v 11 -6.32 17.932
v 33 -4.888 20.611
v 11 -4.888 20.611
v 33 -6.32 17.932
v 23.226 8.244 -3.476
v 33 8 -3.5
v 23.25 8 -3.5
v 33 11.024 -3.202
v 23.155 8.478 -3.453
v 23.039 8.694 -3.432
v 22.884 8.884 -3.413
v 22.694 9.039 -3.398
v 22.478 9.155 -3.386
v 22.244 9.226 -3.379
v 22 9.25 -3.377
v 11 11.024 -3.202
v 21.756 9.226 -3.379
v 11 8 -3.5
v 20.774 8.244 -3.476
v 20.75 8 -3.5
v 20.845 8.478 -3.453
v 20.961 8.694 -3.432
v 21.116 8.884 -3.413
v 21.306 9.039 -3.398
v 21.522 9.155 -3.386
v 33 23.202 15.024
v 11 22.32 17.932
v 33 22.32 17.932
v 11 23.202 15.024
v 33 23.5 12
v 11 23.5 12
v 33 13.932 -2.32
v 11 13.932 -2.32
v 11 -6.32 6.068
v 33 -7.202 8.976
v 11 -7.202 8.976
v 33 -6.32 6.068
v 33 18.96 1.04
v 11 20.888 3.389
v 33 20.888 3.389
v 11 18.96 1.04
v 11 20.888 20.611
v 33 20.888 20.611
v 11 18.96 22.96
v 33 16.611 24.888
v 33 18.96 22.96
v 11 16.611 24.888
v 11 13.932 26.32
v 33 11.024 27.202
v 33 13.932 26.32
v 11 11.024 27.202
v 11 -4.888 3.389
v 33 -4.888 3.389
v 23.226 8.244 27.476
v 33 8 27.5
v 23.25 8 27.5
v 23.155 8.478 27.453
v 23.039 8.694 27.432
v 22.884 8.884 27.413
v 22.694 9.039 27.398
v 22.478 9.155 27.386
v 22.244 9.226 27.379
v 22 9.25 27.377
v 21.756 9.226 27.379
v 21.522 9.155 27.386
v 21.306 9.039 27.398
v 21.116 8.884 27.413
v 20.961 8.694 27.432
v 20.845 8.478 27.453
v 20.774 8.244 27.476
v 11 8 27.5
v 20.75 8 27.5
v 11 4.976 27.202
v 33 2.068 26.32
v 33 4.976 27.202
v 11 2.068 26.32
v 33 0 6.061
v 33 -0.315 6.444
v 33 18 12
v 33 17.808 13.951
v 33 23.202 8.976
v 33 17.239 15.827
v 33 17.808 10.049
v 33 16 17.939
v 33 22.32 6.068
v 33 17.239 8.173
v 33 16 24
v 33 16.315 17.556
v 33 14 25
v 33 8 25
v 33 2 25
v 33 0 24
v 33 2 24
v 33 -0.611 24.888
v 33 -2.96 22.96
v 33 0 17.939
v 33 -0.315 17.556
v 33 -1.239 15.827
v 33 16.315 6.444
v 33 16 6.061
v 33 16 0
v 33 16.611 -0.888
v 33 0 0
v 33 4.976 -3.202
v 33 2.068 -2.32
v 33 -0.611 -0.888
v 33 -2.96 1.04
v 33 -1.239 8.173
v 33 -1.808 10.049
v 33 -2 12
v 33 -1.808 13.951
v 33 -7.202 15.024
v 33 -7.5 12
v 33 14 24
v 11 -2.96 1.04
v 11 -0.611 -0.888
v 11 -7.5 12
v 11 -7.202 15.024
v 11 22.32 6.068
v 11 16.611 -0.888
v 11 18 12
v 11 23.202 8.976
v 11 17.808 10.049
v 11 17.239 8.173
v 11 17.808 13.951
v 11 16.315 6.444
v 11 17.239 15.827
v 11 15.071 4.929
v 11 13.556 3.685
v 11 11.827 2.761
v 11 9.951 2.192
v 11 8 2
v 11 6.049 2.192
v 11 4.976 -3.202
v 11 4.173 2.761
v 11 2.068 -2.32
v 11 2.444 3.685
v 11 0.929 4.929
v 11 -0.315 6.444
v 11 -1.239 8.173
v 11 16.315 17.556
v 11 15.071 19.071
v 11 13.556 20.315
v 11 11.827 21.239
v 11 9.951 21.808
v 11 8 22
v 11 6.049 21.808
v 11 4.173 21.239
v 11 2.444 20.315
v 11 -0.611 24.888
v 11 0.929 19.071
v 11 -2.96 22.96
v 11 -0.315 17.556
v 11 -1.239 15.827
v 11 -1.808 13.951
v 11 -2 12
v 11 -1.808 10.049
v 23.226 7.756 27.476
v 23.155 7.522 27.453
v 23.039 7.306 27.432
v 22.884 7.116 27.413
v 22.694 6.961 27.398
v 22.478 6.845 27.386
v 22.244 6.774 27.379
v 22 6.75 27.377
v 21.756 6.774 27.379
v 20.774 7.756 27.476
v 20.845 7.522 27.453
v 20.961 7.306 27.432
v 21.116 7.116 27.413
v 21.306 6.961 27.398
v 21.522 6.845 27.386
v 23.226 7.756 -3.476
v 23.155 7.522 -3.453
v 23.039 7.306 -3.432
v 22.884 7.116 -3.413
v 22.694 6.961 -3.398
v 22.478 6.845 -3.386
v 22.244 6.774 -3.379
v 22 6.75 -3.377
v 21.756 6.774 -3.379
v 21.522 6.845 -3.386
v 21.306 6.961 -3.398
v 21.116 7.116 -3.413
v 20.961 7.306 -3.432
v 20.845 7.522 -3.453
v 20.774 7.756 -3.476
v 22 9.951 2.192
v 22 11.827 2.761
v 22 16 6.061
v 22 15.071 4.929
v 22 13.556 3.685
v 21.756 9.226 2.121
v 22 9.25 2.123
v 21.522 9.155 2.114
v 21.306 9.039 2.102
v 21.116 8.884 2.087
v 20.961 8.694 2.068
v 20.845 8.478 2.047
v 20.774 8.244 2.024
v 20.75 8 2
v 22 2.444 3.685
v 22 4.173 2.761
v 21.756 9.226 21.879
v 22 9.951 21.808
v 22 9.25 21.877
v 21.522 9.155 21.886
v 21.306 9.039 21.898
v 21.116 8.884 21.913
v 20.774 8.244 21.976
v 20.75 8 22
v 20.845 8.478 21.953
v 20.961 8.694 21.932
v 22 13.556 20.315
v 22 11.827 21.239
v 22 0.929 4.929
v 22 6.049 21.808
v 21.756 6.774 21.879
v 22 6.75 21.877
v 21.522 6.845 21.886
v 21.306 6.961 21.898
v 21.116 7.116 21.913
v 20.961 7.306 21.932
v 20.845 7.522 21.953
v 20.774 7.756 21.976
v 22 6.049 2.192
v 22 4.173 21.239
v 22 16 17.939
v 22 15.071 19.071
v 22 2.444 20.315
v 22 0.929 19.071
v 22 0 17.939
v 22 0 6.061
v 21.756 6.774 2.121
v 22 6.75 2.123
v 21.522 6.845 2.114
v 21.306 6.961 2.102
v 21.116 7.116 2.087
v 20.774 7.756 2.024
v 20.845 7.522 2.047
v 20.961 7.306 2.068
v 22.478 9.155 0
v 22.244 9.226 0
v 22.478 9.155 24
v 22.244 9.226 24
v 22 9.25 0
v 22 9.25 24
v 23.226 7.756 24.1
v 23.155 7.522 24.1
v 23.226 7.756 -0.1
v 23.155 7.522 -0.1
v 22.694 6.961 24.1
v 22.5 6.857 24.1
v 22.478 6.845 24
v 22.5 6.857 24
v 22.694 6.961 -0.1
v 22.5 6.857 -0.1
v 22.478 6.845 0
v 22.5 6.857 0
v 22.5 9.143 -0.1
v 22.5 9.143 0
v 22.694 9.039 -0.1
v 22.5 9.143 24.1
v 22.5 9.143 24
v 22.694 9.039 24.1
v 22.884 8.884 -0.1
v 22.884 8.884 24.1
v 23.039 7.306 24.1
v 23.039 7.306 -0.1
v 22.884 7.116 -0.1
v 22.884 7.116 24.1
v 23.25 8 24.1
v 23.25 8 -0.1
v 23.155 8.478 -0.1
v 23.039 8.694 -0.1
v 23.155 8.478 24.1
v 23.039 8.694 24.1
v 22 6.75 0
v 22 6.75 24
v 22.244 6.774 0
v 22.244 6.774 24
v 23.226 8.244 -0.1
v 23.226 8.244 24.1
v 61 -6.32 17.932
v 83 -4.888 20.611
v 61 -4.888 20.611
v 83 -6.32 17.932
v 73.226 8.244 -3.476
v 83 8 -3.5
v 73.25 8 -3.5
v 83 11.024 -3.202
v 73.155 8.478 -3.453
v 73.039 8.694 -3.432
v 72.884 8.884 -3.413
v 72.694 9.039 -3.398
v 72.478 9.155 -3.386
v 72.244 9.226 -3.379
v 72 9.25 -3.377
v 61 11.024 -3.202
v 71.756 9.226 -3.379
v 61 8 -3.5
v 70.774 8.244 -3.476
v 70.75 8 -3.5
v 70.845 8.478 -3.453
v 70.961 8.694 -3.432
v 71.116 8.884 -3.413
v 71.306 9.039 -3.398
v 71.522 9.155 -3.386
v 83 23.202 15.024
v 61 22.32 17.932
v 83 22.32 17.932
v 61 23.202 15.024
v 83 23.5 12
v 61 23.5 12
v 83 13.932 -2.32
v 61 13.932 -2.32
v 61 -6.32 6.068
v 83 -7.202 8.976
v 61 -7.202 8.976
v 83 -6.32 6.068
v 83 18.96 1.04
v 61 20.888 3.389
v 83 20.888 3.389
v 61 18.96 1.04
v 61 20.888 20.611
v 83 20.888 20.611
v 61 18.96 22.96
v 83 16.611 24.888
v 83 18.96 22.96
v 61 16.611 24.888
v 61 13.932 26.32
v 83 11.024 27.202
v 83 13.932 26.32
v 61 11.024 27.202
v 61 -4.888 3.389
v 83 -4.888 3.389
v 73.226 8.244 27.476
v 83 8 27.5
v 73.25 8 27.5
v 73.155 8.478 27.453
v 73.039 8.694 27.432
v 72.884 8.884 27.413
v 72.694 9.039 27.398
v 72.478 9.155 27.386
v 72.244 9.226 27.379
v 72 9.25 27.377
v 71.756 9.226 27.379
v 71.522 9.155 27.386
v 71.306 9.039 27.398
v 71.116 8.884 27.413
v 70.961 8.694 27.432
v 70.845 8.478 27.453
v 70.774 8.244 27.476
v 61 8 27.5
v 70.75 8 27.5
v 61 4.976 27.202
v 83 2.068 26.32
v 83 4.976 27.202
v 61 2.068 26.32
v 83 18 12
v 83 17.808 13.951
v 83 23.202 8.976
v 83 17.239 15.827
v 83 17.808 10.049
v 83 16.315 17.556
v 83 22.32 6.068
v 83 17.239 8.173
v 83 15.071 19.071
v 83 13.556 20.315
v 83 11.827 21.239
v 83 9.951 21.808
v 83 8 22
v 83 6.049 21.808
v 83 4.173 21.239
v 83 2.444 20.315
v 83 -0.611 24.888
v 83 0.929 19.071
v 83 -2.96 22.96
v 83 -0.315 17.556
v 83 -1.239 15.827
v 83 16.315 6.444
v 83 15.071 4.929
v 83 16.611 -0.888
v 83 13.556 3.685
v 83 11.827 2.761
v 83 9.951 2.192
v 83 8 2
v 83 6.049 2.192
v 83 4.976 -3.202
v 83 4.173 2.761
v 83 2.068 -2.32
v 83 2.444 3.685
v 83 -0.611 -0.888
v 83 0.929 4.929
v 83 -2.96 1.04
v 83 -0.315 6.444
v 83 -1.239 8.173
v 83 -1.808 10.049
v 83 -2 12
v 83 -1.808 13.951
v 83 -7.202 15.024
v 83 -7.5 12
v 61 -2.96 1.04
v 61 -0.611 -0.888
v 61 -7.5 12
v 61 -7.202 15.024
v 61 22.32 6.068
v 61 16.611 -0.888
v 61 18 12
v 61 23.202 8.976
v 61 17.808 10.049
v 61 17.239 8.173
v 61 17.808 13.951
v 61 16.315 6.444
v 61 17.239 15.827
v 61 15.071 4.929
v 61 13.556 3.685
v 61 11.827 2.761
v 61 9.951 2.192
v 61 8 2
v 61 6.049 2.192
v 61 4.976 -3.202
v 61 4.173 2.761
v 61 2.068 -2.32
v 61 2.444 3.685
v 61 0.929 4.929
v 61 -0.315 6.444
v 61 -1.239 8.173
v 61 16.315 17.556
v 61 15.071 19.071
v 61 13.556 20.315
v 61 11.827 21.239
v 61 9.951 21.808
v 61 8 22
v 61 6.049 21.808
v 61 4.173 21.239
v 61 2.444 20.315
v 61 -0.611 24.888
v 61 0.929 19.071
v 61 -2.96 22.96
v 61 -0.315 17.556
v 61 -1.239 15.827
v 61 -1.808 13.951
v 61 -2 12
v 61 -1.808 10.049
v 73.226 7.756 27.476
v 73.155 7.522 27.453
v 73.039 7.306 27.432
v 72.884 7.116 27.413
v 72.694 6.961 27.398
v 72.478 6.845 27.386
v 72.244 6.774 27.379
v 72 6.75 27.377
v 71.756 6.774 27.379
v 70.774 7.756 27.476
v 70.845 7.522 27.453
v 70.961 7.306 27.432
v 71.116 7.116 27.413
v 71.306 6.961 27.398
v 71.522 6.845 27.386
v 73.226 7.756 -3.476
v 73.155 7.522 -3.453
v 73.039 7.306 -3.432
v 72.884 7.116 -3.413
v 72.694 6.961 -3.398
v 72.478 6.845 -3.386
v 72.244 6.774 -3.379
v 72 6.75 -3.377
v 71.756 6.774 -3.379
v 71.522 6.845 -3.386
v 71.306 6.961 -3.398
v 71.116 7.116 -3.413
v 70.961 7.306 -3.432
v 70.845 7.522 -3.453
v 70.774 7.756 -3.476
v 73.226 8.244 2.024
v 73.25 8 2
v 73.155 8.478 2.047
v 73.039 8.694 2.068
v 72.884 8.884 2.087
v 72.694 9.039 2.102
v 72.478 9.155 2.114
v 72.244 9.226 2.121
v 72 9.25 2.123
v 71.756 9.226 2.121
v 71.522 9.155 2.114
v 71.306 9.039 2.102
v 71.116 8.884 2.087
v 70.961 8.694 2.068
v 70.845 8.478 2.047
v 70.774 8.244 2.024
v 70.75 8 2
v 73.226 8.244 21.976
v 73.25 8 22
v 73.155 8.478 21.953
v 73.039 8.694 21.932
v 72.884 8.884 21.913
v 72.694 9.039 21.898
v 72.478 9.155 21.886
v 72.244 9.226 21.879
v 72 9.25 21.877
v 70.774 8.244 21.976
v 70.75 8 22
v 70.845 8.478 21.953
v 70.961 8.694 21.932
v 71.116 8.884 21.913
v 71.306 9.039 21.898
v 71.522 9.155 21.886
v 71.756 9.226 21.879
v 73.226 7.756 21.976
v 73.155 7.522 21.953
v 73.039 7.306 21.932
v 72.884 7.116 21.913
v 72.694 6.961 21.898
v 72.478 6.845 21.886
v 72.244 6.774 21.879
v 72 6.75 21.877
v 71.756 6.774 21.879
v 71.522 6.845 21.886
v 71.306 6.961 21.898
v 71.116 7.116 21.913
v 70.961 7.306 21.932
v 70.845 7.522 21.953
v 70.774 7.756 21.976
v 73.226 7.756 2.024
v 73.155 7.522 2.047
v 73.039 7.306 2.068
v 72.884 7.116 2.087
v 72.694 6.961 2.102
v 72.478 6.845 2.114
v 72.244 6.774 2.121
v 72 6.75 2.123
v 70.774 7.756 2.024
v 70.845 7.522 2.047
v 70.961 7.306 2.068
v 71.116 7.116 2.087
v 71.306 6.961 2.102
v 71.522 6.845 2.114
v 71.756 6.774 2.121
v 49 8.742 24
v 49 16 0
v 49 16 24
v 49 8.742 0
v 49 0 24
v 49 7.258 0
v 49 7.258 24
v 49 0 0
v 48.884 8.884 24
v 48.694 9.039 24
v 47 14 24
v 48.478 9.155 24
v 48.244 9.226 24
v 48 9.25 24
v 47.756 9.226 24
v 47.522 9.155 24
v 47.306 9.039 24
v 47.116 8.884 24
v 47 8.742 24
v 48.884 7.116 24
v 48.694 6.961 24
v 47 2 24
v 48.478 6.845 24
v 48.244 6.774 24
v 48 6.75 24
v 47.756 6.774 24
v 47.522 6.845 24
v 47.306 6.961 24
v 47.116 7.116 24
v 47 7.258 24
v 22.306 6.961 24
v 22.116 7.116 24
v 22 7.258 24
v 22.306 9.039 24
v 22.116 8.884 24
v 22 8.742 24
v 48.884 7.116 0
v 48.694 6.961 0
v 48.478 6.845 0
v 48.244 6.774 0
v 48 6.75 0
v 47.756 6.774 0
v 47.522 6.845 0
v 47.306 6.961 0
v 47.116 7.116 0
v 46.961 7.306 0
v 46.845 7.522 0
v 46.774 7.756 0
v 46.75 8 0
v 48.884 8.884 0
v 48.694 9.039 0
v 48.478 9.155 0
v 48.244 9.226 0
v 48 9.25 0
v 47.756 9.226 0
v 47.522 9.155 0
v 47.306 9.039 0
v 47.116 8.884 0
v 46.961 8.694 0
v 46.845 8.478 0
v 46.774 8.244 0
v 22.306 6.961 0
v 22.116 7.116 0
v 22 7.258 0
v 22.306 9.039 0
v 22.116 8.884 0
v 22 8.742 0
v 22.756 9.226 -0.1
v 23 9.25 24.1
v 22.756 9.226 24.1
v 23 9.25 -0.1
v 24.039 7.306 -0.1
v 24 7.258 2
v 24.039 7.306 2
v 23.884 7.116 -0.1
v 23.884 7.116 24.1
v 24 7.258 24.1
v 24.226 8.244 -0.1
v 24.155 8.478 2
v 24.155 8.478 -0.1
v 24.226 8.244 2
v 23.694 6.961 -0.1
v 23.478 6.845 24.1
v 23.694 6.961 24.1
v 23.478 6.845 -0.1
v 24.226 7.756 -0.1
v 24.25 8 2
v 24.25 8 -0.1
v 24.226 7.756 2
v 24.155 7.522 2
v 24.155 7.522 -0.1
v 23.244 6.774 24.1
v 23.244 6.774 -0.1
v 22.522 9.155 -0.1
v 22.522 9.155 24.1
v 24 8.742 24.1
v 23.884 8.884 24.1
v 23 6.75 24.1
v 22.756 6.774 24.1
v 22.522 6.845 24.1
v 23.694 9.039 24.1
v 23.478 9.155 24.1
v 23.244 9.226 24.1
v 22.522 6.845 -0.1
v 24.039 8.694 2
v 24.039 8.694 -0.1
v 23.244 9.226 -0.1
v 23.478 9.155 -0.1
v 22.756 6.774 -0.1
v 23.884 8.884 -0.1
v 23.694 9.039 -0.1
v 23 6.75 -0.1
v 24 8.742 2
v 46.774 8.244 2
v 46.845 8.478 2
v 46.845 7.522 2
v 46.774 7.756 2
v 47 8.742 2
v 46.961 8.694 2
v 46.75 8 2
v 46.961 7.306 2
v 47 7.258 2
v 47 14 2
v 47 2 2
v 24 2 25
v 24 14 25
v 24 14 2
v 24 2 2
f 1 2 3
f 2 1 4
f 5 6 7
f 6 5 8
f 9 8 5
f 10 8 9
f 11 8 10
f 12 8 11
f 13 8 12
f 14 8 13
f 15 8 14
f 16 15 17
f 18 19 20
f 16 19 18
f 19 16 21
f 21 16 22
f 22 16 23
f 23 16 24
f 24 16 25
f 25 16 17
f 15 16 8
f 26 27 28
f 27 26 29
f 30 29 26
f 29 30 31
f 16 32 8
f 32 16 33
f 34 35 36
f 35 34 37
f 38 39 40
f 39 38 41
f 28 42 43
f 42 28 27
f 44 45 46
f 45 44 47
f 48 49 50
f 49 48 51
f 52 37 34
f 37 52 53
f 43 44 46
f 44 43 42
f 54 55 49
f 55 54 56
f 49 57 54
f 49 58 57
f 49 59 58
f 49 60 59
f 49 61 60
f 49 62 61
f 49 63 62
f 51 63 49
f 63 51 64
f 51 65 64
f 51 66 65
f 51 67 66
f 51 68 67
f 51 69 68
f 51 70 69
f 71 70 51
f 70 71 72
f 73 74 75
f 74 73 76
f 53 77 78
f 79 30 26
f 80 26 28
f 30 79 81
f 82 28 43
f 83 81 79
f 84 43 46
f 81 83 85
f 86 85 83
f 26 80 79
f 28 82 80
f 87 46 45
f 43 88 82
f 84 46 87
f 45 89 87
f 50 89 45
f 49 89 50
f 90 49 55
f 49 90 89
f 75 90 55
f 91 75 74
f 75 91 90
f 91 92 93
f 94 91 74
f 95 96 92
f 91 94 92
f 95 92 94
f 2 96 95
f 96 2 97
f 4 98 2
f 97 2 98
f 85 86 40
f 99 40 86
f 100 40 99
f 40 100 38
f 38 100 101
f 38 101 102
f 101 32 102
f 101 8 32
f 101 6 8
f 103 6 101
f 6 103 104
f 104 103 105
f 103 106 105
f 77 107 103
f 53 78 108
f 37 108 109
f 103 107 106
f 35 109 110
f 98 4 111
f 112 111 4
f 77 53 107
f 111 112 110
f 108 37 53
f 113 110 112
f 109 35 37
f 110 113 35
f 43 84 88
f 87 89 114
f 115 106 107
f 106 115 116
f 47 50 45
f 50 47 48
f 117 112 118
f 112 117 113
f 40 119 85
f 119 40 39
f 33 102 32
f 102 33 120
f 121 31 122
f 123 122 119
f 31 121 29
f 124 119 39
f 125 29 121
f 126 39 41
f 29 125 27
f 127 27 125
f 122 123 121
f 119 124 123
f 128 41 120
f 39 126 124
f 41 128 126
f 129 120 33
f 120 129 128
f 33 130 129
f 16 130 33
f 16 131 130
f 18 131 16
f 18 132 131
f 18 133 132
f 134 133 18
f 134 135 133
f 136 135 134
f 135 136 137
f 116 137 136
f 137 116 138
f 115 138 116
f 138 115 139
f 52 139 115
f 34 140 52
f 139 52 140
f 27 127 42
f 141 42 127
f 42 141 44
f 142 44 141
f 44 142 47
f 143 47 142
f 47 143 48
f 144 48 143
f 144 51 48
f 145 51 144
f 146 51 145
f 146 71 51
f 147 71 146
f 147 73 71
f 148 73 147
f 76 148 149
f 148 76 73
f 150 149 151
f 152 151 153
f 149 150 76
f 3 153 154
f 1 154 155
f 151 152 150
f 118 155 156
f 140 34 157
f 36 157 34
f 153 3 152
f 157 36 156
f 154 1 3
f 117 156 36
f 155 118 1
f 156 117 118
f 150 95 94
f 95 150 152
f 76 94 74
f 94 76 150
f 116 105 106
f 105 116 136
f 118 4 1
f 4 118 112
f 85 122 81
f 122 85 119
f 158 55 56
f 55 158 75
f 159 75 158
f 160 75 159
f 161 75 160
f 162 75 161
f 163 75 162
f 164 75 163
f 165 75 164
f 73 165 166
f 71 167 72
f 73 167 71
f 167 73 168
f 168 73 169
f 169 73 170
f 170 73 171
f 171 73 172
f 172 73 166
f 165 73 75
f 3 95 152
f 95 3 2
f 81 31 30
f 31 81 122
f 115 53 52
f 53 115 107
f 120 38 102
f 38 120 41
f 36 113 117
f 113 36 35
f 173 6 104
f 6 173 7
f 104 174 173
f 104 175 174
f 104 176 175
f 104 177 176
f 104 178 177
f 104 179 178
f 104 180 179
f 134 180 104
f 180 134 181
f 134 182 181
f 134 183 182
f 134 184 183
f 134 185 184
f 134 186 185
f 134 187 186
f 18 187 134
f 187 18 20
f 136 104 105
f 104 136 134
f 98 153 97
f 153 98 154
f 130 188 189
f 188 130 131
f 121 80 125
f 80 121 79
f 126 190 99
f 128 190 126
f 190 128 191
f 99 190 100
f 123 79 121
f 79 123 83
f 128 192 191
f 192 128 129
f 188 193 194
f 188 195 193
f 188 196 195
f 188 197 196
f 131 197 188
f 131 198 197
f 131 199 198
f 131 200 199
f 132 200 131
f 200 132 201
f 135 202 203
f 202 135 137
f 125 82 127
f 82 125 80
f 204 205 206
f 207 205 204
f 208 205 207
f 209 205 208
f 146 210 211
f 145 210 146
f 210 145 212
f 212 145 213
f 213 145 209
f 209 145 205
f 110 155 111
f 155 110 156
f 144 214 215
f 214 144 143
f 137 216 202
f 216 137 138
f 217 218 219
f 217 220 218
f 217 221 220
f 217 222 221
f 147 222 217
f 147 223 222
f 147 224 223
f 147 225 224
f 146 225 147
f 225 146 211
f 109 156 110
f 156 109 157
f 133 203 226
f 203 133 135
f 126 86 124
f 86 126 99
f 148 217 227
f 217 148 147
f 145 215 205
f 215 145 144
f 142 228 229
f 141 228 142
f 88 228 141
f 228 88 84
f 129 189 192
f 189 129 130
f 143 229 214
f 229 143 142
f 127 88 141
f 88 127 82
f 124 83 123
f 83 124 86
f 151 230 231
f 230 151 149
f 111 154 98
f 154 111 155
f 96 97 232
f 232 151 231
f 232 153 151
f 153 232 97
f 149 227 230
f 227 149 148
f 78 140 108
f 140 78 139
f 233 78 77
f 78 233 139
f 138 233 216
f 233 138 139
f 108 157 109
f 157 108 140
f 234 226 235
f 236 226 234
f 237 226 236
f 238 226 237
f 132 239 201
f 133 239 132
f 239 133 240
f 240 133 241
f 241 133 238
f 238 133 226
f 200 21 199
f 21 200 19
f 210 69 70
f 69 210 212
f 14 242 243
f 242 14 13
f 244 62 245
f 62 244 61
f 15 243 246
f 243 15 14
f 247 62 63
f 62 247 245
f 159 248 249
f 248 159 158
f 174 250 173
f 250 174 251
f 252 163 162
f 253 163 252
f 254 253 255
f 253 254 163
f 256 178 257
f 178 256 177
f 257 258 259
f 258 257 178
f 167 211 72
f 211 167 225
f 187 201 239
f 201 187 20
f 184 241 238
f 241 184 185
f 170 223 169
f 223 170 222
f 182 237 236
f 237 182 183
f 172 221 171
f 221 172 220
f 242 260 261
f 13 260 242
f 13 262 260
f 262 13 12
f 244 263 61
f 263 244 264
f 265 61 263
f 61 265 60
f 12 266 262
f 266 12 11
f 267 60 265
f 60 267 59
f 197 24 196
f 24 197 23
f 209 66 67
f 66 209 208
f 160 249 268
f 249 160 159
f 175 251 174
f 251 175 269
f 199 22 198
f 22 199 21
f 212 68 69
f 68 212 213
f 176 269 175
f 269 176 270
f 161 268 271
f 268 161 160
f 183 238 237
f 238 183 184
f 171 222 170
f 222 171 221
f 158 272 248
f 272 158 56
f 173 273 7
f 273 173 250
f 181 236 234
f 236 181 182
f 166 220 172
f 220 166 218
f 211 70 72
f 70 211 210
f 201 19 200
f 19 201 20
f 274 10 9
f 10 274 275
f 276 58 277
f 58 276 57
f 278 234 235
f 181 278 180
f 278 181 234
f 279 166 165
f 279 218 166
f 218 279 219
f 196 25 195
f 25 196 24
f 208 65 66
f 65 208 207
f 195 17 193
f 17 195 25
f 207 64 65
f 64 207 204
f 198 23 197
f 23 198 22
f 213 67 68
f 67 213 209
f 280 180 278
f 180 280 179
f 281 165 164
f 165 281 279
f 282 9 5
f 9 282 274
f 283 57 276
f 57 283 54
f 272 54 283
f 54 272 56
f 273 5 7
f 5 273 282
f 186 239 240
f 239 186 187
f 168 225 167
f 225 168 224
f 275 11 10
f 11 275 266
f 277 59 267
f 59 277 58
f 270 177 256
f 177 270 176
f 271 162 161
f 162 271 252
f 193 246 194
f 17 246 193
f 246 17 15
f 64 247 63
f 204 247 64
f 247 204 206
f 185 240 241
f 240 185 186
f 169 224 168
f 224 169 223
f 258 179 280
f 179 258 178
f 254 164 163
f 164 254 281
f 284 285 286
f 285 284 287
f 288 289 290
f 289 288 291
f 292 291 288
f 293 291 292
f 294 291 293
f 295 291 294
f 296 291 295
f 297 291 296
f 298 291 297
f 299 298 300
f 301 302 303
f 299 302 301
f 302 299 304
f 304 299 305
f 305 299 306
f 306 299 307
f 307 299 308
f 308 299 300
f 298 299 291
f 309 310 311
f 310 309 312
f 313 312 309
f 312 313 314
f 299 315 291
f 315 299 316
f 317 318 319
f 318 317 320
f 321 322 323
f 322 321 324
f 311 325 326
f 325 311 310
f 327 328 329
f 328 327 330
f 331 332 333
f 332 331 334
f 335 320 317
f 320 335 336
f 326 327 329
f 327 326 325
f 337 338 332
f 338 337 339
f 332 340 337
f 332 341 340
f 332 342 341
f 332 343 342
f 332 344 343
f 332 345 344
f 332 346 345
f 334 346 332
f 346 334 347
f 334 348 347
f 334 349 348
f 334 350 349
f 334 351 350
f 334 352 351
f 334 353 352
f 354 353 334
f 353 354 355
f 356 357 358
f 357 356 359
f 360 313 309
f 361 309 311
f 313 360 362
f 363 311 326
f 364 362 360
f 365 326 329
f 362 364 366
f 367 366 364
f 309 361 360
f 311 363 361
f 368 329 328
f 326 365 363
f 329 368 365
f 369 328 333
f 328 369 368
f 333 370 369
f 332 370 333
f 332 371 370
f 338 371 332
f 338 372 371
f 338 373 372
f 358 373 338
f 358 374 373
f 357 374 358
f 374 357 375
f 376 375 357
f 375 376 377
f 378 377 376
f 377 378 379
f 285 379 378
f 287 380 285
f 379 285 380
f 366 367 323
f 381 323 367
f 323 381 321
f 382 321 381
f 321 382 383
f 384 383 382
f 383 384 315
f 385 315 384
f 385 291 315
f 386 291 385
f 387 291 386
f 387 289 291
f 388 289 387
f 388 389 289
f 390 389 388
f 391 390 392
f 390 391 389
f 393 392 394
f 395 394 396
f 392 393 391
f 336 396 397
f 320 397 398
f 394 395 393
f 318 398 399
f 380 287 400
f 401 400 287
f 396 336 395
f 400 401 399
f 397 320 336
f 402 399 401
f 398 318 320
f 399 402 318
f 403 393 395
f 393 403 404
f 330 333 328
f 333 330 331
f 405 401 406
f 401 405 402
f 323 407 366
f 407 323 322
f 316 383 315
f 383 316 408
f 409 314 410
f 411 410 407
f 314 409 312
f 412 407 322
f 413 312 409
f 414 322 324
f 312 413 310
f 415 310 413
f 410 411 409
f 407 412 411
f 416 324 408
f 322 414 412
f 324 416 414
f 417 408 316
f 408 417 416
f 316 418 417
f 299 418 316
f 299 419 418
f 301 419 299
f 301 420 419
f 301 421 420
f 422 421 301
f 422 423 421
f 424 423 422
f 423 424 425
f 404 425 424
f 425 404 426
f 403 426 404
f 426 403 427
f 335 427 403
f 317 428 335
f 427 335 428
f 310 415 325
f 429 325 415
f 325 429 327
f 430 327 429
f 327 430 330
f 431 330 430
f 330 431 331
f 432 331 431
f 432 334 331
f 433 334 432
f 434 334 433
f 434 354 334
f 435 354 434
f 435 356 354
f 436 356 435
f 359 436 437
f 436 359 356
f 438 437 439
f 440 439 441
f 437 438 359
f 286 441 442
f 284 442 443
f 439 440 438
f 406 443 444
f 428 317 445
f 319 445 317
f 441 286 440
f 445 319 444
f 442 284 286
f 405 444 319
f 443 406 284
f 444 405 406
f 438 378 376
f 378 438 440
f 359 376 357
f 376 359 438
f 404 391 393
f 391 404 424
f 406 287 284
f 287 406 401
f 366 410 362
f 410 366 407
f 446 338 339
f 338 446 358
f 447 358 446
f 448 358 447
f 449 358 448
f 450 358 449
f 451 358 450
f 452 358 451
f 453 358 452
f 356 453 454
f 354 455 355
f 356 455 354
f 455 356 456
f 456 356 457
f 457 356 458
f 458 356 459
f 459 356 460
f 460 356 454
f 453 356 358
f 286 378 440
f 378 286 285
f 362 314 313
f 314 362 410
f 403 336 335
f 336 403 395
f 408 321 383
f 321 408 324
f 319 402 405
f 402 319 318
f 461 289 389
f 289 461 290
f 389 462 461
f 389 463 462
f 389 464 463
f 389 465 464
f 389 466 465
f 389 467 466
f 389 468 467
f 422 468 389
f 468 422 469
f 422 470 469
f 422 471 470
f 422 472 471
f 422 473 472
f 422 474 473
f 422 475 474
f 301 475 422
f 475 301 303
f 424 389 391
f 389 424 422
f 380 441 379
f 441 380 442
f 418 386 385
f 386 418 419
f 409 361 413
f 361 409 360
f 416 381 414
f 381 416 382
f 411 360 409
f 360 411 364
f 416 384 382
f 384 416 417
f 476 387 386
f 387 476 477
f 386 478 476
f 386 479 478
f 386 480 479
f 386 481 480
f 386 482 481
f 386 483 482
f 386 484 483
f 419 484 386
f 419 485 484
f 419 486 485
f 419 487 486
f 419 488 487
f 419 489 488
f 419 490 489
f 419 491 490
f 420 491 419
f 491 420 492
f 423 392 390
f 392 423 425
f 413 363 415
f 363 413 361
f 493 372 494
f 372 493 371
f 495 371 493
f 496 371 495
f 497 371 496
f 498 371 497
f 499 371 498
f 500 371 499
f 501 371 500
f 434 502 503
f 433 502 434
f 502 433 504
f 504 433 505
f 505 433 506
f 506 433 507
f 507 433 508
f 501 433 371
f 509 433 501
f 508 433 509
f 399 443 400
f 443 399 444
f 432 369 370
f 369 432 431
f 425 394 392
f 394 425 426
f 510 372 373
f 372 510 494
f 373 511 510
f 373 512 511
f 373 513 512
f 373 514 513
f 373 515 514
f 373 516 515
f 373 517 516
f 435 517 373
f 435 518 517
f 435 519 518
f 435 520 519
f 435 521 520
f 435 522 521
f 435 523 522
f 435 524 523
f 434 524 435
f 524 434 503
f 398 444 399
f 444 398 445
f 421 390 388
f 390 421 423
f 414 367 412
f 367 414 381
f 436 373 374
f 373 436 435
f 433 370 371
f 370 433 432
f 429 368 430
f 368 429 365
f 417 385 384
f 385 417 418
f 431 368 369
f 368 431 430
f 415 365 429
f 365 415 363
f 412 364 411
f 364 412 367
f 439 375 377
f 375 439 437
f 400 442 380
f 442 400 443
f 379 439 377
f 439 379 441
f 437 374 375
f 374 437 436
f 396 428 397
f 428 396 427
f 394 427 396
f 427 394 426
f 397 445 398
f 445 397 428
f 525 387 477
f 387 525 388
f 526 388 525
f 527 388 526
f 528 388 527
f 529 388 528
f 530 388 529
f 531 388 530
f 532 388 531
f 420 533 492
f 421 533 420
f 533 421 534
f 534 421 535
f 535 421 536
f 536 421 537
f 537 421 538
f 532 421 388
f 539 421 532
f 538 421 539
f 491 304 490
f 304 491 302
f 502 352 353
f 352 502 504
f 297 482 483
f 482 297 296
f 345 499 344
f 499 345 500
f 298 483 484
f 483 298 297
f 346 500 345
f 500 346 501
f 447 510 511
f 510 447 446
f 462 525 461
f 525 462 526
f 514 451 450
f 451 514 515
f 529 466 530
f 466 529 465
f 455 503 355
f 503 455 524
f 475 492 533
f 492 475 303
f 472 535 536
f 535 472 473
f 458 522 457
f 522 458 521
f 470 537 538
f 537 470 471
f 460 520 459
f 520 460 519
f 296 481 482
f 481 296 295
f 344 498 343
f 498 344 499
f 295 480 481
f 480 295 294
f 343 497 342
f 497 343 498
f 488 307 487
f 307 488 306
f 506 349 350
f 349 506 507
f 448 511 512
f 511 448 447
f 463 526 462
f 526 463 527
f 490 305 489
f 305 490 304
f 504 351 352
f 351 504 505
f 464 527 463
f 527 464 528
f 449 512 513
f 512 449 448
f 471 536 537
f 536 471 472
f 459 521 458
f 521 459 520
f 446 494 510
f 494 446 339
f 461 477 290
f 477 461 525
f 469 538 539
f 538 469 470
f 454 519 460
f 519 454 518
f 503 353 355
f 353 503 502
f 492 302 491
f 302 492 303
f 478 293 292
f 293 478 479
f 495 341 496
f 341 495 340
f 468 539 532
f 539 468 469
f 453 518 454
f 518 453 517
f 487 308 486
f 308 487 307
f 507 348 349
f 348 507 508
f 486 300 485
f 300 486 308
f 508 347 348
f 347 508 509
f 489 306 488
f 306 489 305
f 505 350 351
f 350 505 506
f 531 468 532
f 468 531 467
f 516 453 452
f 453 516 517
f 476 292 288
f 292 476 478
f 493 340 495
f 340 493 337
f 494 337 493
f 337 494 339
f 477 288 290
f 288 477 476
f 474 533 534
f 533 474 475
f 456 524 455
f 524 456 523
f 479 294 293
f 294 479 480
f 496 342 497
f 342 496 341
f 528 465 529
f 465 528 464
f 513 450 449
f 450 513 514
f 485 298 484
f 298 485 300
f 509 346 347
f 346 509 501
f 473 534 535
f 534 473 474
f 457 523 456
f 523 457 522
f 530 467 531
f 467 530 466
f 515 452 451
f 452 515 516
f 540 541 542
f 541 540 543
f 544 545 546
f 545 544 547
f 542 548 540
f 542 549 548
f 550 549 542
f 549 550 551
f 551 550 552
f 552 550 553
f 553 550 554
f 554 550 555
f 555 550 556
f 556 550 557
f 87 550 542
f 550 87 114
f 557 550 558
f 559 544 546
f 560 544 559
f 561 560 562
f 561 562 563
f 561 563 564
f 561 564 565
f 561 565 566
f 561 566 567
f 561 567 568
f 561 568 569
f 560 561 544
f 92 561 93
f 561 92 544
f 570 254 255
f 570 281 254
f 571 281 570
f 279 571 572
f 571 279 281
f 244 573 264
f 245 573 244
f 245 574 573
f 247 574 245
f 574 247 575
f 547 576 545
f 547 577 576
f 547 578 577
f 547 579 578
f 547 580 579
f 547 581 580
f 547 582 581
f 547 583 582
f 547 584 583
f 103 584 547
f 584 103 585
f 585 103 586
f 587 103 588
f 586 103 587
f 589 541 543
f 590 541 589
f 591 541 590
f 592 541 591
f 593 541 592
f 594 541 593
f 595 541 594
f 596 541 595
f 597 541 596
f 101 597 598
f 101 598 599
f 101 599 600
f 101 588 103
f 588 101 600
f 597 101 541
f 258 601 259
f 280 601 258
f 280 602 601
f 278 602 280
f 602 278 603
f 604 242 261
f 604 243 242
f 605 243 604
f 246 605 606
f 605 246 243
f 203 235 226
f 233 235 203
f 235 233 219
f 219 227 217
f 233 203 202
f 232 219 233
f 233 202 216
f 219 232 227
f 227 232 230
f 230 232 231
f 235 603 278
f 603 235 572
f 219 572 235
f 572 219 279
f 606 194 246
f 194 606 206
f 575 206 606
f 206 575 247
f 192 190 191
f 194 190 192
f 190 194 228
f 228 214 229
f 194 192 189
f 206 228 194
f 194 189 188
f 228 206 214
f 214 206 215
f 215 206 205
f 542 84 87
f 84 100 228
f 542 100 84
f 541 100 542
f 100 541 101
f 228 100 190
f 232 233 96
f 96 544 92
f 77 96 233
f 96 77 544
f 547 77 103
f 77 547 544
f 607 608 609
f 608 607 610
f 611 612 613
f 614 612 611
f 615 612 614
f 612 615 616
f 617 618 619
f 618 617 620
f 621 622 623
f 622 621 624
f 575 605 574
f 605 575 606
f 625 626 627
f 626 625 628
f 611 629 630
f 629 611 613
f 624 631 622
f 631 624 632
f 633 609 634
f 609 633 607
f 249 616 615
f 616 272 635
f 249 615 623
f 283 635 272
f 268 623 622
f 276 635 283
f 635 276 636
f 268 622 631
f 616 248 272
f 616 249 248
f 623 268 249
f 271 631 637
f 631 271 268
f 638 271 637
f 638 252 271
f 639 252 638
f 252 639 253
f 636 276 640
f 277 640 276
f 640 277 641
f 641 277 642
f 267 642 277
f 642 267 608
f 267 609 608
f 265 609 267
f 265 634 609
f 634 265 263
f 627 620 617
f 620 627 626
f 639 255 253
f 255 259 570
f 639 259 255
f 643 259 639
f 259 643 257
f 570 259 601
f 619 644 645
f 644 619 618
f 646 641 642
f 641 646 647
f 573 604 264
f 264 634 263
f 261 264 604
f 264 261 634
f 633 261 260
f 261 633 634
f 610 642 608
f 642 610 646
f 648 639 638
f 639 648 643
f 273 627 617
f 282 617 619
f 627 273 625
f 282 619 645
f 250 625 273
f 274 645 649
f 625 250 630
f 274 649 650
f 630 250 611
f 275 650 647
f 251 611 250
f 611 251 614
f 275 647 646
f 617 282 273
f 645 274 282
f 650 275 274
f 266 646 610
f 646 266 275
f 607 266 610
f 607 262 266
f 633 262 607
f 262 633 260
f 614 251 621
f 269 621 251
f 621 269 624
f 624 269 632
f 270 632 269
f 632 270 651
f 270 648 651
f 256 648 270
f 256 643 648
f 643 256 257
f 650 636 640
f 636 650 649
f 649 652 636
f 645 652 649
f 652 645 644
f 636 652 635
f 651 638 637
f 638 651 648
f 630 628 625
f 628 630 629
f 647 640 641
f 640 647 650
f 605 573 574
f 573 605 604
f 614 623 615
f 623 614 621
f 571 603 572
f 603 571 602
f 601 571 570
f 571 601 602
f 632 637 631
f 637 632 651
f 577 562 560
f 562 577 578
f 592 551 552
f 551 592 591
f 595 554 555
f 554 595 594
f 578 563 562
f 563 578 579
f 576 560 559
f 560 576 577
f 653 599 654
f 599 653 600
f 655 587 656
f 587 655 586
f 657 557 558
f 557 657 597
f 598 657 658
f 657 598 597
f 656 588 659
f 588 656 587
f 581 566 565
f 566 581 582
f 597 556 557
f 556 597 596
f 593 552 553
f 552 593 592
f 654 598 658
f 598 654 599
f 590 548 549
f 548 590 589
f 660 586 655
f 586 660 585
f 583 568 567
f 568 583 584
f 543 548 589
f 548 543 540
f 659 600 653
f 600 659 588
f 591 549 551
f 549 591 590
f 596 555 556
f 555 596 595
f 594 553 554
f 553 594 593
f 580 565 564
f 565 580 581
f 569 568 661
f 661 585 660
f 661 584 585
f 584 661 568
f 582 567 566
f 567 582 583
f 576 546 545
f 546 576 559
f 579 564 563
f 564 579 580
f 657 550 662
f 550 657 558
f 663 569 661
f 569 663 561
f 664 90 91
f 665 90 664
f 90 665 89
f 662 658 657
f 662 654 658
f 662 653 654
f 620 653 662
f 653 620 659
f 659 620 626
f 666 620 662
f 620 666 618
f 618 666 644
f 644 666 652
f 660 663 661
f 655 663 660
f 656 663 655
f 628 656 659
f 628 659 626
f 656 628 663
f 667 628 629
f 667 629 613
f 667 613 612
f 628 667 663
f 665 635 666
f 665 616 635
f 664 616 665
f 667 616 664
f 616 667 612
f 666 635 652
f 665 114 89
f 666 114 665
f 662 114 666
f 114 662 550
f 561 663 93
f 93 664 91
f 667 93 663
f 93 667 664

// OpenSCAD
// ============================================================
// elbow_joint_bracket.scad
// Elbow Joint Bracket for Humanoid Welcoming Robot
// Servo mount interface for MG90S servo + dual PVC pipe adapters
//
// Print Settings:
//   Material:    PLA
//   Infill:      80%
//   Layer height: 0.2 mm
//   Supports:    None required
//   Weight:      ~15 g
//   Print time:  ~6 minutes
// ============================================================

$fn = 32;
$fa = 6;
$fs = 1;

// --- Parametric Variables ---
servo_width            = 23;   // mm  MG90S body width
servo_depth            = 12;   // mm  MG90S body depth
servo_height           = 22;   // mm  MG90S body height
pvc_bore               = 20;   // mm  PVC pipe inner diameter
pvc_wall               = 2.5;  // mm  PVC pipe wall thickness
mounting_hole_diameter = 2.5;  // mm  M2.5 screw holes
wall_thickness         = 2.0;  // mm  bracket wall thickness

// Derived
pvc_od             = pvc_bore + 2 * pvc_wall;
servo_mount_length = servo_width  + 2 * wall_thickness;
servo_mount_width  = servo_depth  + 2 * wall_thickness;
servo_mount_height = servo_height + wall_thickness;

// ============================================================
// Module: pvc_side_adapter
// Single-side PVC collar
// ============================================================
module pvc_side_adapter(h = 20) {
    collar_od = pvc_od + 2 * wall_thickness * 1.5;
    difference() {
        cylinder(d = collar_od, h = h);
        translate([0, 0, -0.1])
            cylinder(d = pvc_bore, h = h + 0.2);
        // Retention screw hole
        translate([0, 0, h / 2])
            rotate([90, 0, 0])
                cylinder(d = mounting_hole_diameter,
                         h = collar_od + 0.2, center = true);
    }
}

// ============================================================
// Module: servo_pocket_mg90s
// Recessed pocket for MG90S servo body
// ============================================================
module servo_pocket_mg90s() {
    translate([wall_thickness, wall_thickness, wall_thickness])
        cube([servo_width, servo_depth, servo_height + 1]);
}

// ============================================================
// Module: elbow_joint_bracket
// Central servo block flanked by two PVC adapters
// ============================================================
module elbow_joint_bracket() {
    adapter_h  = 22;
    total_span = adapter_h + servo_mount_length + adapter_h;

    difference() {
        union() {
            // Central servo mount block
            translate([adapter_h, 0, 0])
                cube([servo_mount_length, servo_mount_width, servo_mount_height]);
            // Left PVC adapter (upper arm side)
            translate([adapter_h / 2, servo_mount_width / 2,
                       servo_mount_height / 2])
                rotate([0, 90, 0])
                    rotate([0, 0, 90])
                        pvc_side_adapter(adapter_h);
            // Right PVC adapter (forearm side)
            translate([adapter_h + servo_mount_length +
                       servo_mount_height / 2,
                       servo_mount_width / 2,
                       servo_mount_height / 2])
                rotate([0, 90, 0])
                    rotate([0, 0, 90])
                        pvc_side_adapter(adapter_h);
        }
        // Servo cavity
        translate([adapter_h, 0, 0])
            servo_pocket_mg90s();
        // Servo horn centre hole
        cx = adapter_h + servo_mount_length / 2;
        cy = servo_mount_width / 2;
        translate([cx, cy, servo_mount_height - 0.1])
            cylinder(d = 5, h = wall_thickness + 0.2);
        // Servo mounting screw holes (2 each side of servo)
        for (side = [-1, 1])
            translate([adapter_h + servo_mount_length / 2 +
                       side * (servo_width / 2 + wall_thickness / 2),
                       servo_mount_width / 2,
                       -0.1])
                cylinder(d = mounting_hole_diameter,
                         h = servo_mount_height + 0.2);
    }
}

// ============================================================
// Render
// ============================================================
color("SteelBlue")
    elbow_joint_bracket();
